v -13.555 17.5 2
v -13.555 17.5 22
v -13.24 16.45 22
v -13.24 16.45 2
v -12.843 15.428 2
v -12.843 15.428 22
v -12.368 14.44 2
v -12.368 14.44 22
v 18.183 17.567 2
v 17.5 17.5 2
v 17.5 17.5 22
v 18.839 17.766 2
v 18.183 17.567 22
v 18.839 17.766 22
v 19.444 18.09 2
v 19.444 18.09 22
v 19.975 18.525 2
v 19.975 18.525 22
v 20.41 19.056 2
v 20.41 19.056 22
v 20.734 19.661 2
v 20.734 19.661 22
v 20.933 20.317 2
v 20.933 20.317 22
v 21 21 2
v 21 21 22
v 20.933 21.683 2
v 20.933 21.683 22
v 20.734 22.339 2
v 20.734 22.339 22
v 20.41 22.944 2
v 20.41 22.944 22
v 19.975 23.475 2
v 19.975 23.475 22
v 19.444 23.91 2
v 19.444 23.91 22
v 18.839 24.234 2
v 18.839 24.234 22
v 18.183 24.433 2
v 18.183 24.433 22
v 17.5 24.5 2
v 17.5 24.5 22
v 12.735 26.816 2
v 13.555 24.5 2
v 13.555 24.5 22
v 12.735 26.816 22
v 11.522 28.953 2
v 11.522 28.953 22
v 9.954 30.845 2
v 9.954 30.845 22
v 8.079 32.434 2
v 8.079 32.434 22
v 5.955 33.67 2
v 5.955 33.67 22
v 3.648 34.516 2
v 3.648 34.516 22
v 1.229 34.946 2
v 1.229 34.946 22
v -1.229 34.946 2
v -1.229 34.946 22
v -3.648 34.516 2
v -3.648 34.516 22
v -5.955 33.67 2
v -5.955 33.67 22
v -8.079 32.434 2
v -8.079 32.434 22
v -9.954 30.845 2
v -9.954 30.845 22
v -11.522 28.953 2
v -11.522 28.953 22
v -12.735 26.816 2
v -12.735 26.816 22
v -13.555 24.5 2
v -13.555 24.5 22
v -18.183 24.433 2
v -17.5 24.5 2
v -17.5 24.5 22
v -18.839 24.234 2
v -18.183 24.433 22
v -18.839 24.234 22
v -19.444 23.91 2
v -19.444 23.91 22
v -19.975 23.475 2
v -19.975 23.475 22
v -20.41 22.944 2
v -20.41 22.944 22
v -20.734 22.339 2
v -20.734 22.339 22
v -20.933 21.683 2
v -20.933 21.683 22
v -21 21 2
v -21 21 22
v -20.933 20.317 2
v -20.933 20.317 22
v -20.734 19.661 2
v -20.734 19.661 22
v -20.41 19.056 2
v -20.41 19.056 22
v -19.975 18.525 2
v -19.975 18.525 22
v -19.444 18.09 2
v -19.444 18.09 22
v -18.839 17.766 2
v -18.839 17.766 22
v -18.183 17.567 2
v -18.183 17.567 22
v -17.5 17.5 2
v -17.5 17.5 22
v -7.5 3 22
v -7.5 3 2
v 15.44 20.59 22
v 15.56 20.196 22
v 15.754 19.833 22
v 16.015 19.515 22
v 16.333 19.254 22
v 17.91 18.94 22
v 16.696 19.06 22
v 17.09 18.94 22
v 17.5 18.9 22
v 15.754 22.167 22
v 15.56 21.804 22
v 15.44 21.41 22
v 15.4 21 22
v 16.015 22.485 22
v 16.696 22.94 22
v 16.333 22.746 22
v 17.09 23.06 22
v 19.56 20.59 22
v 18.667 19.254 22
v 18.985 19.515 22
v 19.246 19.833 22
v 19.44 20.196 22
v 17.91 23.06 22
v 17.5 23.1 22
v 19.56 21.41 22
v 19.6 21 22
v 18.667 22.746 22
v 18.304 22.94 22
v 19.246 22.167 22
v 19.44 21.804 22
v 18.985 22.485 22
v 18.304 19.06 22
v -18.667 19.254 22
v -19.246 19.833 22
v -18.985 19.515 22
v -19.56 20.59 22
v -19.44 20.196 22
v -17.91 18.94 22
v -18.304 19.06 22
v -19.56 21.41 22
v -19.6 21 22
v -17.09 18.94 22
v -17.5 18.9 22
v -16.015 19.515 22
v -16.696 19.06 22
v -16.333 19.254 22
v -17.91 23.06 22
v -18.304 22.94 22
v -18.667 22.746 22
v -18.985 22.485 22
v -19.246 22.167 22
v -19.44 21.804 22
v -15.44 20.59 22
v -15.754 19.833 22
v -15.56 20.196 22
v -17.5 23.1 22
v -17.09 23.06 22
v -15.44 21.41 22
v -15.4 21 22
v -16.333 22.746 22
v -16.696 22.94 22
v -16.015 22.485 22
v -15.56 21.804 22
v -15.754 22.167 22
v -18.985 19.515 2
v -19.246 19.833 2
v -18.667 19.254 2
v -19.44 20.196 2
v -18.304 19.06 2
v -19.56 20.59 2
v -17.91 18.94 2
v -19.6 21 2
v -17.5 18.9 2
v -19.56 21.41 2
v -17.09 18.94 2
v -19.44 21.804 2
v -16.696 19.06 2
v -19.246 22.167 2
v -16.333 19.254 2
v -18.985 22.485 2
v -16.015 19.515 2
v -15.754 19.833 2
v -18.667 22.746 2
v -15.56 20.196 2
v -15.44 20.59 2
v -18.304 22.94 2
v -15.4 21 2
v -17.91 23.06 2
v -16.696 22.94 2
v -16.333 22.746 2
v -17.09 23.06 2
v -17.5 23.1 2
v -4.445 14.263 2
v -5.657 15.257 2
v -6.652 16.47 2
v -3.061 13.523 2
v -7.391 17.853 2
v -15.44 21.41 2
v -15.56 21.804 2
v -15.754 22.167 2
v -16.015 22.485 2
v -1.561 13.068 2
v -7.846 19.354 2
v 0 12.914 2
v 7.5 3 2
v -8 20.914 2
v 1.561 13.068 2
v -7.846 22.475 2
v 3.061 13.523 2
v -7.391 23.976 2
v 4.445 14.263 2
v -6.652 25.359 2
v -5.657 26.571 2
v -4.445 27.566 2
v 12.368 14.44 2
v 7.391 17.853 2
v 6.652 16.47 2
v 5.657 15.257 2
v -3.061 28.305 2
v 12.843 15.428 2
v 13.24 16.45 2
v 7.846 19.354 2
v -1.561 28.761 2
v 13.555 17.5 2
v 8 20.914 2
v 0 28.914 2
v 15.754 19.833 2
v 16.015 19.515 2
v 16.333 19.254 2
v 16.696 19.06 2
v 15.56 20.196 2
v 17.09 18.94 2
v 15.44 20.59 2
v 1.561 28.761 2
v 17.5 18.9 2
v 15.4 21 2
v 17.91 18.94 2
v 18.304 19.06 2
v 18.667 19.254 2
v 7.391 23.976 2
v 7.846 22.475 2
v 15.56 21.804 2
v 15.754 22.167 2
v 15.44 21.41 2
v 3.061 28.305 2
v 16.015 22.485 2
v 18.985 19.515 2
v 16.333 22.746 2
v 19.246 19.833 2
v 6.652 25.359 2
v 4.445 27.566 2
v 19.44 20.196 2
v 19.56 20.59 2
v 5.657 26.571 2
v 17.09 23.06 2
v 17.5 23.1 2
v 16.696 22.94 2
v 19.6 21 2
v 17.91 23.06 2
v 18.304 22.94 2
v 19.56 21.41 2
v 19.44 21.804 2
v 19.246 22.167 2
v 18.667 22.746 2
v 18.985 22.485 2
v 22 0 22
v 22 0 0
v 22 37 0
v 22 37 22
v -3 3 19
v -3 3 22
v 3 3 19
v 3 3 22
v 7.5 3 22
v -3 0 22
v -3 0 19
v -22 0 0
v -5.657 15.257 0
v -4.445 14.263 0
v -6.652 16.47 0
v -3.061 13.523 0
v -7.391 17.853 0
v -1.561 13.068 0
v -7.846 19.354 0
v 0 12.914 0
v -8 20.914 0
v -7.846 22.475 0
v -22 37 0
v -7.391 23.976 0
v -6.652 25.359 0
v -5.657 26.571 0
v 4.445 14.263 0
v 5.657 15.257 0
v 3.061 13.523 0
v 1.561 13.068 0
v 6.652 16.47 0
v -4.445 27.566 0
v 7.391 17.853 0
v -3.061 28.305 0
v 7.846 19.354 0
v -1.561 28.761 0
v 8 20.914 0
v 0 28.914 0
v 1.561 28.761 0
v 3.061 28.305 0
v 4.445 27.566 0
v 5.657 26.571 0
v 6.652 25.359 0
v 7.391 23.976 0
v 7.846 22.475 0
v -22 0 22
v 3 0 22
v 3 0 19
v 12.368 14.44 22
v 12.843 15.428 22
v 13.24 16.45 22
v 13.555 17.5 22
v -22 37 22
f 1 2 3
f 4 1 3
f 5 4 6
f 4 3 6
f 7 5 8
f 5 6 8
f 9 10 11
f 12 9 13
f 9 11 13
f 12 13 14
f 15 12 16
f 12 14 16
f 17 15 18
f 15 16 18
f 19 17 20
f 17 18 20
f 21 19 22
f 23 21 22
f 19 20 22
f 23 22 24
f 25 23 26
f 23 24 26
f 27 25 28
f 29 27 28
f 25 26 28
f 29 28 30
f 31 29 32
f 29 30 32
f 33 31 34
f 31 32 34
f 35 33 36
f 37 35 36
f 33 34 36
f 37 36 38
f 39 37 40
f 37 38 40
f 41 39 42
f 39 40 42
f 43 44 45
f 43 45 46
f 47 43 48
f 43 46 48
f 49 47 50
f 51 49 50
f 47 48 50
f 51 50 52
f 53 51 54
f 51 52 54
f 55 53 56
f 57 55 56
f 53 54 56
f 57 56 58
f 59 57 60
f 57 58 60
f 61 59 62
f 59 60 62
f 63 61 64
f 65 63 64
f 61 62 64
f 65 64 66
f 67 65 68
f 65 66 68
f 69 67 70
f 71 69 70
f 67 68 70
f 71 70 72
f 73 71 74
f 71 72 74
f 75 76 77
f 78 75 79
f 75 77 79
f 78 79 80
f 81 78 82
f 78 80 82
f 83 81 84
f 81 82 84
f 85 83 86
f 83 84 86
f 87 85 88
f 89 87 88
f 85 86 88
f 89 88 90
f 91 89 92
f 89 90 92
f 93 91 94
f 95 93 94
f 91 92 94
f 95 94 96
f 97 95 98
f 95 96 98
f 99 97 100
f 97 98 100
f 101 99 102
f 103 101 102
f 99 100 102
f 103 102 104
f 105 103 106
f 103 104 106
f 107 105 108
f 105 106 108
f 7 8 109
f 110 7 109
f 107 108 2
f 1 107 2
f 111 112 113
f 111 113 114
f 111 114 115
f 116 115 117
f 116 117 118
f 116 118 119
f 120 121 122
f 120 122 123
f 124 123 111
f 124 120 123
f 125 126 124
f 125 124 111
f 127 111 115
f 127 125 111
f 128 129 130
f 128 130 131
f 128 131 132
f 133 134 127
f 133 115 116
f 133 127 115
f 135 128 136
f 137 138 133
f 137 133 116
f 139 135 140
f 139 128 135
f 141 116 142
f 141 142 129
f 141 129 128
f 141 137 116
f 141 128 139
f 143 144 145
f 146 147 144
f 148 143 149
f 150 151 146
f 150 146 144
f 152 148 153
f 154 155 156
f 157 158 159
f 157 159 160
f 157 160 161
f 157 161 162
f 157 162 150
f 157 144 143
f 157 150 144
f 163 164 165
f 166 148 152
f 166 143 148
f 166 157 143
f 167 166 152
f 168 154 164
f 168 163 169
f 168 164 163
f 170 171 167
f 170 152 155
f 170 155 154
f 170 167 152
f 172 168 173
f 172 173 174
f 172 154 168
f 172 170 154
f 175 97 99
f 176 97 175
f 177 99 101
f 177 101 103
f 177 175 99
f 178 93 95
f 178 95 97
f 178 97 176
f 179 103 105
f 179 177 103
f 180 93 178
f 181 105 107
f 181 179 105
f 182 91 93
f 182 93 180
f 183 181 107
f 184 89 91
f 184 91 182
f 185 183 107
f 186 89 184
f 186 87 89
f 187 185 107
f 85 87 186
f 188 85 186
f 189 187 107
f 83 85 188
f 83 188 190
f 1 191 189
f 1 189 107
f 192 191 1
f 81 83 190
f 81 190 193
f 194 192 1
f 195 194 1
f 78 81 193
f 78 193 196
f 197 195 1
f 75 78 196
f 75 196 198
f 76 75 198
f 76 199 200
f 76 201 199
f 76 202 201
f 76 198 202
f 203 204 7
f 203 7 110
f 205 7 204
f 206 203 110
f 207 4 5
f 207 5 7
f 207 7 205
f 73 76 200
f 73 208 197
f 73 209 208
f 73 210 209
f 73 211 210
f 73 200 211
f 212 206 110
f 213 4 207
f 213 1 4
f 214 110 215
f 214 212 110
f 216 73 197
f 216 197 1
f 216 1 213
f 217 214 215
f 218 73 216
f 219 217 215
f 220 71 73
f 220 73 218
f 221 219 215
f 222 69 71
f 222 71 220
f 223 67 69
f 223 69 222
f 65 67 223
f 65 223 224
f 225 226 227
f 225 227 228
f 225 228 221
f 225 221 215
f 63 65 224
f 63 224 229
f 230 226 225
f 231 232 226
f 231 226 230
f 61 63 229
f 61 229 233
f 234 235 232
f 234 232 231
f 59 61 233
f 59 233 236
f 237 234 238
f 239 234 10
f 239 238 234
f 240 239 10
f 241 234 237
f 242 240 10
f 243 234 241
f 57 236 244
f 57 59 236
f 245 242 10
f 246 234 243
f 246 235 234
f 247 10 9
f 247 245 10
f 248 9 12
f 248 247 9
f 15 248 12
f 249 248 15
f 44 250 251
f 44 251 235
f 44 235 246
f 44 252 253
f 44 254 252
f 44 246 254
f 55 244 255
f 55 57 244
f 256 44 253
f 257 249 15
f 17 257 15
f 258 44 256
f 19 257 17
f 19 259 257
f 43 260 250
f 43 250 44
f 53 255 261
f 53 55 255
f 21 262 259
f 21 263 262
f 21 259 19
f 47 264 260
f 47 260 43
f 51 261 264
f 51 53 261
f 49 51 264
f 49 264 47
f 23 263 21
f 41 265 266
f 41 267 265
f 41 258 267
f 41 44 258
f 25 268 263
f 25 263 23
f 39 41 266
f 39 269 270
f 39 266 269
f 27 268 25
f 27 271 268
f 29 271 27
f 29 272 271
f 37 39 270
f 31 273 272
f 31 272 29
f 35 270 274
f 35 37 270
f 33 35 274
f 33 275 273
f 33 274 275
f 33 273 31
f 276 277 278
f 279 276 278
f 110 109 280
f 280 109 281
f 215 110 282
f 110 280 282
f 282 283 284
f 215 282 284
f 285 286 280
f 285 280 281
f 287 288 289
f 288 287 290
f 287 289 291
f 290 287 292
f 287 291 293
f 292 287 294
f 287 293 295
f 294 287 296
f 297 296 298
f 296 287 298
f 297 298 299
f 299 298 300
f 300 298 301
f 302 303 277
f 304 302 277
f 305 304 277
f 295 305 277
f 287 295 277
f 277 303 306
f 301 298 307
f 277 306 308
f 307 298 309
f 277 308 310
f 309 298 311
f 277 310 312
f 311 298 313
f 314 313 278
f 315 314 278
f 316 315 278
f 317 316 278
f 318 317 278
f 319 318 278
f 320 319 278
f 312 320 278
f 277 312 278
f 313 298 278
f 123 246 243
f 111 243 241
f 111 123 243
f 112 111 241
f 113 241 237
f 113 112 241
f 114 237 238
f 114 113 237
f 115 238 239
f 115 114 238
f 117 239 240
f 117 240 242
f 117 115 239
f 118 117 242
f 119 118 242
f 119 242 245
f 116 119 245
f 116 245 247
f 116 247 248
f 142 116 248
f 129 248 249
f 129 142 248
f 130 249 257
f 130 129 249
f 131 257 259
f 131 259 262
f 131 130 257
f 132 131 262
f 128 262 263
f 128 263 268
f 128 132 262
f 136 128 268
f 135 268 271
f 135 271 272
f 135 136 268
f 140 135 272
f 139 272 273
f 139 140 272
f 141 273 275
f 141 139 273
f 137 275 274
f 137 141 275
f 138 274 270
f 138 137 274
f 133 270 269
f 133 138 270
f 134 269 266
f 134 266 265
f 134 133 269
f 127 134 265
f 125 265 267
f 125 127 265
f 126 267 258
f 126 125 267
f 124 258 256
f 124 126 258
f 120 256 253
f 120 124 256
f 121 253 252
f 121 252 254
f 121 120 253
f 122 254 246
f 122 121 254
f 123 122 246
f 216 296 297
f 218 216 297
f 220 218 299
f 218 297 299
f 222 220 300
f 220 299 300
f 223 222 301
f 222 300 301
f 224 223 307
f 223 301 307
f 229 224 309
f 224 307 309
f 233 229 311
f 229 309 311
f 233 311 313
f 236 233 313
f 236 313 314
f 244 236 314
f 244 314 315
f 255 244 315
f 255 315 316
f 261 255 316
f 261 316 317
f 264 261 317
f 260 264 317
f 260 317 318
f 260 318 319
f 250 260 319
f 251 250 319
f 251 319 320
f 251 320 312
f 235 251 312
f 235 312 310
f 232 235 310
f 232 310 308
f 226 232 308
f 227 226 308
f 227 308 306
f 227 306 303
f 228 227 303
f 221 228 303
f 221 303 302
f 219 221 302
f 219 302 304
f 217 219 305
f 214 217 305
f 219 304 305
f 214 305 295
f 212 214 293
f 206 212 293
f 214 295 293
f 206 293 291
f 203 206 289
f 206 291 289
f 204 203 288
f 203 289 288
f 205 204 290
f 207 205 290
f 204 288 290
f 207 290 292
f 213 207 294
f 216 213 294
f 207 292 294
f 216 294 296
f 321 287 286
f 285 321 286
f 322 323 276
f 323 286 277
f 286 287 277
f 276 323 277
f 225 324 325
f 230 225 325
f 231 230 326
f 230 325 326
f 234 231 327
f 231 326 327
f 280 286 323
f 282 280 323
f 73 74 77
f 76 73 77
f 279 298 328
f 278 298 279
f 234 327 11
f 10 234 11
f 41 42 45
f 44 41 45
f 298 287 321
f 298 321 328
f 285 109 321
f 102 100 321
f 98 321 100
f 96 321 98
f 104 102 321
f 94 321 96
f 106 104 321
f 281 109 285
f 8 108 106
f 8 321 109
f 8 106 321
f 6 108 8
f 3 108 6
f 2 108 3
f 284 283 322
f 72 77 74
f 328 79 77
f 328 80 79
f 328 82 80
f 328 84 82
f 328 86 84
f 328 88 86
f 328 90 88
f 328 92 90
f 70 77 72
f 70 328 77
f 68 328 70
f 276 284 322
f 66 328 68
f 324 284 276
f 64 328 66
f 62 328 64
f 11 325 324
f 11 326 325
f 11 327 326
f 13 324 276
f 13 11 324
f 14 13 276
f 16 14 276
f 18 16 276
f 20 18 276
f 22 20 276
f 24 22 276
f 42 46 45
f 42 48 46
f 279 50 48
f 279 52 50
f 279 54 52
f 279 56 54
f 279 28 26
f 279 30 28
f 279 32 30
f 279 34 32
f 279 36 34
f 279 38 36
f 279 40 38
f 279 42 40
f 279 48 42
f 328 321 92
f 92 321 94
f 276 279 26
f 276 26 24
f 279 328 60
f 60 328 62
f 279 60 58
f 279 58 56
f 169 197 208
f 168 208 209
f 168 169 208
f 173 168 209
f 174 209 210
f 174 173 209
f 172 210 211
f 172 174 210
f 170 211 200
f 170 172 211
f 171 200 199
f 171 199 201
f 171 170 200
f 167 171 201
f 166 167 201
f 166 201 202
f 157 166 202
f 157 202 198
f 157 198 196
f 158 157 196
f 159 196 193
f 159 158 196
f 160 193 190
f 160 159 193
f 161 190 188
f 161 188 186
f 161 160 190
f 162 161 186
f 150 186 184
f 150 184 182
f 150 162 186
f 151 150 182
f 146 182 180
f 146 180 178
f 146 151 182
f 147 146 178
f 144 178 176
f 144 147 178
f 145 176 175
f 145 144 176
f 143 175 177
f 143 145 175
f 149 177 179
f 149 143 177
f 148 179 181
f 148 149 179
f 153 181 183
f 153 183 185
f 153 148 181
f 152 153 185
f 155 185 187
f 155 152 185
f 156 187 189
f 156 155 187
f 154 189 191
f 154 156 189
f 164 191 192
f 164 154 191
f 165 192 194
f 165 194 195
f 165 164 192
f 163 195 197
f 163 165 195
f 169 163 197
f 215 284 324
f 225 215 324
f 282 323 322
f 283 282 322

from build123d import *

# Parameters (mm, degrees)
SKETCH_1_W           = 44
SKETCH_1_H           = 37
EXTRUDE_1_DEPTH      = 22
SKETCH_2_R           = 2.1
CUT_EXTRUDE_7_DEPTH  = 20
SKETCH_13_R          = 8
CUT_EXTRUDE_11_DEPTH = 49.342527861
CUT_EXTRUDE_13_REACH = 50.343
SKETCH_15_W          = 6
SKETCH_15_H          = 3


with BuildPart() as part:
    # 草图1 → 凸台-拉伸1 (new body)
    with BuildSketch(Plane.XY):
        with Locations((0, 18.5)):
            Rectangle(SKETCH_1_W, SKETCH_1_H)
    extrude(amount=EXTRUDE_1_DEPTH)

    # 草图2 → 切除-拉伸7 (cut)
    with BuildSketch(Plane.XY.offset(22)):
        with BuildLine():
            Line((-7.5, 3), (7.5, 3))
            Line((7.5, 3), (12.367831524, 14.439760417))
            ThreePointArc((12.367831524, 14.439760417), (13.051639376, 15.934952161), (13.555441712, 17.5))
            Line((13.555441712, 17.5), (17.5, 17.5))
            ThreePointArc((17.5, 17.5), (21, 21), (17.5, 24.5))
            Line((17.5, 24.5), (13.555441712, 24.5))
            ThreePointArc((13.555441712, 24.5), (0, 35), (-13.555441712, 24.5))
            Line((-13.555441712, 24.5), (-17.5, 24.5))
            ThreePointArc((-17.5, 24.5), (-21, 21), (-17.5, 17.5))
            Line((-17.5, 17.5), (-13.555441712, 17.5))
            ThreePointArc((-13.555441712, 17.5), (-13.051639376, 15.934952161), (-12.367831524, 14.439760417))
            Line((-12.367831524, 14.439760417), (-7.5, 3))
        make_face()
        with Locations((-17.5, 21)):
            Circle(SKETCH_2_R, mode=Mode.SUBTRACT)
        with Locations((17.5, 21)):
            Circle(SKETCH_2_R, mode=Mode.SUBTRACT)
    extrude(amount=-CUT_EXTRUDE_7_DEPTH, mode=Mode.SUBTRACT)

    # 草图13 → 切除-拉伸11 (cut, through all)
    with BuildSketch(Plane(origin=(0, 0, 0), x_dir=(-1, 0, 0), z_dir=(0, 0, -1))):
        with Locations((0, 20.914315439)):
            Circle(SKETCH_13_R)
    extrude(amount=-CUT_EXTRUDE_11_DEPTH, mode=Mode.SUBTRACT)

    # 草图15 → 切除-拉伸13 (cut, up to next)
    with BuildSketch(Plane.XZ, mode=Mode.PRIVATE) as cut_extrude_13_sk1:
        with Locations((0, 20.5)):
            Rectangle(SKETCH_15_W, SKETCH_15_H)
    cut_extrude_13_tool1 = extrude(cut_extrude_13_sk1.sketch, amount=-CUT_EXTRUDE_13_REACH, mode=Mode.PRIVATE) & part.part
    add(cut_extrude_13_tool1.solids().sort_by_distance((0, 0, 20.5))[0], mode=Mode.SUBTRACT)


solid = part.part
